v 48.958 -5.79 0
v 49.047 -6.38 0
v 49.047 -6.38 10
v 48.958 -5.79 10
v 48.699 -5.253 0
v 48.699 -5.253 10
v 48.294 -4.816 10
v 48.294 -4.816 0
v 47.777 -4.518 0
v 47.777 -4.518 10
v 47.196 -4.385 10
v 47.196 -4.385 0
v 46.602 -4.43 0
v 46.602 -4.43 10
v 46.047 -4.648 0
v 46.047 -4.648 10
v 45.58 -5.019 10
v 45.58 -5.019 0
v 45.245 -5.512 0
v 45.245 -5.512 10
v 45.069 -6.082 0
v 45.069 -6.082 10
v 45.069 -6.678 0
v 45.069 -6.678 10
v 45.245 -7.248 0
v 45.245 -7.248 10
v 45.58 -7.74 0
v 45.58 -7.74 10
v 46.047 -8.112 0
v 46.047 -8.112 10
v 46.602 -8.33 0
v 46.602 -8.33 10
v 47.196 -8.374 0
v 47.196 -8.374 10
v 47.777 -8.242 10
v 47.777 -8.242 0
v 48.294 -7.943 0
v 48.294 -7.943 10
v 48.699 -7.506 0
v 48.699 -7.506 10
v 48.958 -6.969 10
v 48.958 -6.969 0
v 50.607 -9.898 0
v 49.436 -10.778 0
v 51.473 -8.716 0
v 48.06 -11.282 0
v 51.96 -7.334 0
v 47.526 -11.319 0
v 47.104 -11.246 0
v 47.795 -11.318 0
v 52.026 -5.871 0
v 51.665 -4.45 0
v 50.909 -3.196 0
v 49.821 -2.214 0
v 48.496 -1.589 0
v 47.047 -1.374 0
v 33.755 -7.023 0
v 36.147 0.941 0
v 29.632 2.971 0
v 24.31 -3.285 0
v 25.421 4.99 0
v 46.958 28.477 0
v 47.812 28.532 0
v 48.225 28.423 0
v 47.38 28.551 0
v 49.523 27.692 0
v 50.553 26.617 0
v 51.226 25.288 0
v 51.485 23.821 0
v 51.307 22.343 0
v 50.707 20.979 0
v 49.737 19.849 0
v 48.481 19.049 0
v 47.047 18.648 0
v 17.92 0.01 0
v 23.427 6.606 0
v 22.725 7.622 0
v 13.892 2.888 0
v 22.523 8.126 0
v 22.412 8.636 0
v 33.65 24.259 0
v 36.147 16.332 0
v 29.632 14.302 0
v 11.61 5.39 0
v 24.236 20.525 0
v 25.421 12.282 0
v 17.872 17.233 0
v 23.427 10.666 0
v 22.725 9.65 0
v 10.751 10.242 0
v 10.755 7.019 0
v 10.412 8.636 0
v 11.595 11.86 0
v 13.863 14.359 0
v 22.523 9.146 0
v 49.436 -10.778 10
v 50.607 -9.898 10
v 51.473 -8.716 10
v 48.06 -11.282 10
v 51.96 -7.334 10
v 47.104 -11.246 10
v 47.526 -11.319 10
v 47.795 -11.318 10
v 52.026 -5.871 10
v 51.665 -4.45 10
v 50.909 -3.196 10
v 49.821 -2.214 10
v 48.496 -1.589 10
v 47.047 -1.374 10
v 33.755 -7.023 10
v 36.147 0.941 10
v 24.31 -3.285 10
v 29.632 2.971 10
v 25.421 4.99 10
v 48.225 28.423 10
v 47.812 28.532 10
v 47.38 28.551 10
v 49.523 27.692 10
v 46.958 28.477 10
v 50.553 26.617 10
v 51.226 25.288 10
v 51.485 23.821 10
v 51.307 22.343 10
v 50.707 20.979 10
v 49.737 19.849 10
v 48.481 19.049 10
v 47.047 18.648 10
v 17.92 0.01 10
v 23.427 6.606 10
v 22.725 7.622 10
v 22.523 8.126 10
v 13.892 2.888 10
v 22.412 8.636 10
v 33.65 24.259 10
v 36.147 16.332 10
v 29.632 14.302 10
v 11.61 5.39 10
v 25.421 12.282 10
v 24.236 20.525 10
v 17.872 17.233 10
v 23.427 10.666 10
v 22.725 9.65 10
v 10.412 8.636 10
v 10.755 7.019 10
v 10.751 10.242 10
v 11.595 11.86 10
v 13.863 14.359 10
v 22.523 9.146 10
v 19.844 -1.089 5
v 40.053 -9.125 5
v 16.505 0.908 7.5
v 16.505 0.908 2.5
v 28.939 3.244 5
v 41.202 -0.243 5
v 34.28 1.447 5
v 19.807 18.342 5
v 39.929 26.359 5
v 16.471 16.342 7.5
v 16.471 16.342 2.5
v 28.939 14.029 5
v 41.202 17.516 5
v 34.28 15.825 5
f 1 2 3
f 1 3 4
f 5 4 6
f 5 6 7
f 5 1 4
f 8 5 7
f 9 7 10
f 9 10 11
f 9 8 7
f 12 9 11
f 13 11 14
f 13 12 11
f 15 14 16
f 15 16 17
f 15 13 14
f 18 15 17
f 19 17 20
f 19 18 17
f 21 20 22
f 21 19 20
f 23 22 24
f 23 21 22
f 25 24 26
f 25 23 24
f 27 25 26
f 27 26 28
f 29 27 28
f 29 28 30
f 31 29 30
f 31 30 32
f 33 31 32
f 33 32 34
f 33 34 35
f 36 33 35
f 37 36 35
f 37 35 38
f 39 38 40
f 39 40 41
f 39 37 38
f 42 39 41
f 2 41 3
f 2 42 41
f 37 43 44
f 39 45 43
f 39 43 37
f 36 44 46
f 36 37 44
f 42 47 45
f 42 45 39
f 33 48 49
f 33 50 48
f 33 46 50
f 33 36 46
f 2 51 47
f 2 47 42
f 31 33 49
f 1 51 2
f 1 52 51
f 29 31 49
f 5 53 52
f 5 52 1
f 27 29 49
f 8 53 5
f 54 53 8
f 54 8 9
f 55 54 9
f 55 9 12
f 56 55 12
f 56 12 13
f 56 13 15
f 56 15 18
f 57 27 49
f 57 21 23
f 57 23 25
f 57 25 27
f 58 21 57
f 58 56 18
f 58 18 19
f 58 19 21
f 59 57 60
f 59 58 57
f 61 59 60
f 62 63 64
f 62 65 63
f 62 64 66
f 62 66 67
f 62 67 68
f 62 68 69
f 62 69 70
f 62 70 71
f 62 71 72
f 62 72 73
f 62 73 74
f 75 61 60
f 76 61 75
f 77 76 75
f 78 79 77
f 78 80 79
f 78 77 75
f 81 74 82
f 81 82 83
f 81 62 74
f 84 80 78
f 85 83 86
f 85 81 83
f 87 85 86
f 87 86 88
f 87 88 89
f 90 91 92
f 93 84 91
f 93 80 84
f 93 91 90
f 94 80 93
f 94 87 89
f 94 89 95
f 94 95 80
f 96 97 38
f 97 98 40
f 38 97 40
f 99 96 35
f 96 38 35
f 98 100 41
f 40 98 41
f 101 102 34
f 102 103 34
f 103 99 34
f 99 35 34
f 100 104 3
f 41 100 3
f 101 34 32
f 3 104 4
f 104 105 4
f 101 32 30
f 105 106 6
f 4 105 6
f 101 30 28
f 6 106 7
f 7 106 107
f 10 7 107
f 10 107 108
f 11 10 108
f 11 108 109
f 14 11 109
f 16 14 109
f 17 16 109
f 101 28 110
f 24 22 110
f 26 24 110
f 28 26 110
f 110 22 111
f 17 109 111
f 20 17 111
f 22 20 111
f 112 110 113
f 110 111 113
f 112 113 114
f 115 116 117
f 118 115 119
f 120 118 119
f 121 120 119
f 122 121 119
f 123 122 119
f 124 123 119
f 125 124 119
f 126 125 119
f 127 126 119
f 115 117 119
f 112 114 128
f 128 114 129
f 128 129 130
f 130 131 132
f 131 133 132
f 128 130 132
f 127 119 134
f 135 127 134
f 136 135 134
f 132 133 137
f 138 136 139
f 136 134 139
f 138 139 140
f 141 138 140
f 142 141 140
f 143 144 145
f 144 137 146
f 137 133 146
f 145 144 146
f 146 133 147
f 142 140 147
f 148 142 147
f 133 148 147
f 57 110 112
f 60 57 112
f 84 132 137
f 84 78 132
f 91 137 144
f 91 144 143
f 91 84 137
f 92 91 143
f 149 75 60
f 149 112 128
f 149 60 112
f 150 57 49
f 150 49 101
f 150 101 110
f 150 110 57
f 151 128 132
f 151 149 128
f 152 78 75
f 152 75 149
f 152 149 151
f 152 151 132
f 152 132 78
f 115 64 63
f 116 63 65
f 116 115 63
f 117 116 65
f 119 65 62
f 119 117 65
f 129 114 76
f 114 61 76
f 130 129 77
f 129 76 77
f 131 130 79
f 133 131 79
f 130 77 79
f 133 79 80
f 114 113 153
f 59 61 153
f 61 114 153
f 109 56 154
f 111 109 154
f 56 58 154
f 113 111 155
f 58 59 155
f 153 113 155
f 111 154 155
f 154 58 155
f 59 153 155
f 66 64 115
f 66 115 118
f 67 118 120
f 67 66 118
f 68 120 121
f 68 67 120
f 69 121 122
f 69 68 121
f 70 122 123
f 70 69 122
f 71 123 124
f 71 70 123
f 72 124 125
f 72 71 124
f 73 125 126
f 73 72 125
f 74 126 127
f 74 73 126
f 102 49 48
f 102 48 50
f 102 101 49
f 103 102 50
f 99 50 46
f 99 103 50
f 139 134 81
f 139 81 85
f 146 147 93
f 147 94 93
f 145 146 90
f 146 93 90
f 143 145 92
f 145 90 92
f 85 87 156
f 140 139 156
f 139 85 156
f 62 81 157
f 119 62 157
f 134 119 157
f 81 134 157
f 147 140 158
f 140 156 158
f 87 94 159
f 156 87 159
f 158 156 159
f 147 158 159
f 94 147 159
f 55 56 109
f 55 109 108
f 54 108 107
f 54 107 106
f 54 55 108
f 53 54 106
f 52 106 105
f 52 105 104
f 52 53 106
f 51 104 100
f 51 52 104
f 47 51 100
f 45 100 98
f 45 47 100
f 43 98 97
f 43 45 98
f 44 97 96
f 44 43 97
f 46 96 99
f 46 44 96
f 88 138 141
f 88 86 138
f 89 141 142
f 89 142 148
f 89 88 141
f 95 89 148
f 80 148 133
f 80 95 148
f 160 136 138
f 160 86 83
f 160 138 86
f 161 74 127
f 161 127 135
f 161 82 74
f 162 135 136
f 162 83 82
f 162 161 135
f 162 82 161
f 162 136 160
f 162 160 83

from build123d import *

# Parameters (mm, degrees)
SKETCH1_R           = 2
BOSS_EXTRUDE2_DEPTH = 10
FILLET4_R           = 2
FILLET5_R           = 2


with BuildPart() as part:
    # Sketch1 → Boss-Extrude2 (new body)
    with BuildSketch(Plane.XY):
        with BuildLine():
            ThreePointArc((47.515201165, 28.636720293), (51.481242597, 23.445158013), (47.04657628, 18.647706792))
            add(Edge.make_bspline(
                [(47.04657628, 18.647706792), (23.149465596, 14.415740026), (22.411661364, 8.636217355)],
                knots=[0, 0, 0, 0.485397068, 0.485397068, 0.485397068], degree=2))
            add(Edge.make_bspline(
                [(47.04657628, -1.374266206), (23.149465596, 2.856694684), (22.411661364, 8.636217355)],
                knots=[0, 0, 0, 0.485397068, 0.485397068, 0.485397068], degree=2))
            ThreePointArc((47.04657628, -1.374266206), (52.04657628, -6.145195345), (47.515201165, -11.363279707))
            add(Edge.make_bspline(
                [(47.515201165, -11.363279707), (10.933254614, -0.926951504), (10.411661364, 8.636217355)],
                knots=[0, 0, 0, 0.478869132, 0.478869132, 0.478869132], degree=2))
            add(Edge.make_bspline(
                [(47.515201165, 28.636720293), (10.933254614, 18.199386214), (10.411661364, 8.636217355)],
                knots=[0, 0, 0, 0.478869132, 0.478869132, 0.478869132], degree=2))
        make_face()
        with Locations((47.04657628, -6.379765498)):
            Circle(SKETCH1_R, mode=Mode.SUBTRACT)
    extrude(amount=BOSS_EXTRUDE2_DEPTH)

    # Fillet4
    fillet4_edges = [part.edges().sort_by_distance(p)[0] for p in [
        (47.515201165, 28.636720293, 5),
    ]]
    fillet(fillet4_edges, radius=FILLET4_R)

    # Fillet5
    fillet5_edges = [part.edges().sort_by_distance(p)[0] for p in [
        (47.515201165, -11.363279707, 5),
    ]]
    fillet(fillet5_edges, radius=FILLET5_R)


solid = part.part
